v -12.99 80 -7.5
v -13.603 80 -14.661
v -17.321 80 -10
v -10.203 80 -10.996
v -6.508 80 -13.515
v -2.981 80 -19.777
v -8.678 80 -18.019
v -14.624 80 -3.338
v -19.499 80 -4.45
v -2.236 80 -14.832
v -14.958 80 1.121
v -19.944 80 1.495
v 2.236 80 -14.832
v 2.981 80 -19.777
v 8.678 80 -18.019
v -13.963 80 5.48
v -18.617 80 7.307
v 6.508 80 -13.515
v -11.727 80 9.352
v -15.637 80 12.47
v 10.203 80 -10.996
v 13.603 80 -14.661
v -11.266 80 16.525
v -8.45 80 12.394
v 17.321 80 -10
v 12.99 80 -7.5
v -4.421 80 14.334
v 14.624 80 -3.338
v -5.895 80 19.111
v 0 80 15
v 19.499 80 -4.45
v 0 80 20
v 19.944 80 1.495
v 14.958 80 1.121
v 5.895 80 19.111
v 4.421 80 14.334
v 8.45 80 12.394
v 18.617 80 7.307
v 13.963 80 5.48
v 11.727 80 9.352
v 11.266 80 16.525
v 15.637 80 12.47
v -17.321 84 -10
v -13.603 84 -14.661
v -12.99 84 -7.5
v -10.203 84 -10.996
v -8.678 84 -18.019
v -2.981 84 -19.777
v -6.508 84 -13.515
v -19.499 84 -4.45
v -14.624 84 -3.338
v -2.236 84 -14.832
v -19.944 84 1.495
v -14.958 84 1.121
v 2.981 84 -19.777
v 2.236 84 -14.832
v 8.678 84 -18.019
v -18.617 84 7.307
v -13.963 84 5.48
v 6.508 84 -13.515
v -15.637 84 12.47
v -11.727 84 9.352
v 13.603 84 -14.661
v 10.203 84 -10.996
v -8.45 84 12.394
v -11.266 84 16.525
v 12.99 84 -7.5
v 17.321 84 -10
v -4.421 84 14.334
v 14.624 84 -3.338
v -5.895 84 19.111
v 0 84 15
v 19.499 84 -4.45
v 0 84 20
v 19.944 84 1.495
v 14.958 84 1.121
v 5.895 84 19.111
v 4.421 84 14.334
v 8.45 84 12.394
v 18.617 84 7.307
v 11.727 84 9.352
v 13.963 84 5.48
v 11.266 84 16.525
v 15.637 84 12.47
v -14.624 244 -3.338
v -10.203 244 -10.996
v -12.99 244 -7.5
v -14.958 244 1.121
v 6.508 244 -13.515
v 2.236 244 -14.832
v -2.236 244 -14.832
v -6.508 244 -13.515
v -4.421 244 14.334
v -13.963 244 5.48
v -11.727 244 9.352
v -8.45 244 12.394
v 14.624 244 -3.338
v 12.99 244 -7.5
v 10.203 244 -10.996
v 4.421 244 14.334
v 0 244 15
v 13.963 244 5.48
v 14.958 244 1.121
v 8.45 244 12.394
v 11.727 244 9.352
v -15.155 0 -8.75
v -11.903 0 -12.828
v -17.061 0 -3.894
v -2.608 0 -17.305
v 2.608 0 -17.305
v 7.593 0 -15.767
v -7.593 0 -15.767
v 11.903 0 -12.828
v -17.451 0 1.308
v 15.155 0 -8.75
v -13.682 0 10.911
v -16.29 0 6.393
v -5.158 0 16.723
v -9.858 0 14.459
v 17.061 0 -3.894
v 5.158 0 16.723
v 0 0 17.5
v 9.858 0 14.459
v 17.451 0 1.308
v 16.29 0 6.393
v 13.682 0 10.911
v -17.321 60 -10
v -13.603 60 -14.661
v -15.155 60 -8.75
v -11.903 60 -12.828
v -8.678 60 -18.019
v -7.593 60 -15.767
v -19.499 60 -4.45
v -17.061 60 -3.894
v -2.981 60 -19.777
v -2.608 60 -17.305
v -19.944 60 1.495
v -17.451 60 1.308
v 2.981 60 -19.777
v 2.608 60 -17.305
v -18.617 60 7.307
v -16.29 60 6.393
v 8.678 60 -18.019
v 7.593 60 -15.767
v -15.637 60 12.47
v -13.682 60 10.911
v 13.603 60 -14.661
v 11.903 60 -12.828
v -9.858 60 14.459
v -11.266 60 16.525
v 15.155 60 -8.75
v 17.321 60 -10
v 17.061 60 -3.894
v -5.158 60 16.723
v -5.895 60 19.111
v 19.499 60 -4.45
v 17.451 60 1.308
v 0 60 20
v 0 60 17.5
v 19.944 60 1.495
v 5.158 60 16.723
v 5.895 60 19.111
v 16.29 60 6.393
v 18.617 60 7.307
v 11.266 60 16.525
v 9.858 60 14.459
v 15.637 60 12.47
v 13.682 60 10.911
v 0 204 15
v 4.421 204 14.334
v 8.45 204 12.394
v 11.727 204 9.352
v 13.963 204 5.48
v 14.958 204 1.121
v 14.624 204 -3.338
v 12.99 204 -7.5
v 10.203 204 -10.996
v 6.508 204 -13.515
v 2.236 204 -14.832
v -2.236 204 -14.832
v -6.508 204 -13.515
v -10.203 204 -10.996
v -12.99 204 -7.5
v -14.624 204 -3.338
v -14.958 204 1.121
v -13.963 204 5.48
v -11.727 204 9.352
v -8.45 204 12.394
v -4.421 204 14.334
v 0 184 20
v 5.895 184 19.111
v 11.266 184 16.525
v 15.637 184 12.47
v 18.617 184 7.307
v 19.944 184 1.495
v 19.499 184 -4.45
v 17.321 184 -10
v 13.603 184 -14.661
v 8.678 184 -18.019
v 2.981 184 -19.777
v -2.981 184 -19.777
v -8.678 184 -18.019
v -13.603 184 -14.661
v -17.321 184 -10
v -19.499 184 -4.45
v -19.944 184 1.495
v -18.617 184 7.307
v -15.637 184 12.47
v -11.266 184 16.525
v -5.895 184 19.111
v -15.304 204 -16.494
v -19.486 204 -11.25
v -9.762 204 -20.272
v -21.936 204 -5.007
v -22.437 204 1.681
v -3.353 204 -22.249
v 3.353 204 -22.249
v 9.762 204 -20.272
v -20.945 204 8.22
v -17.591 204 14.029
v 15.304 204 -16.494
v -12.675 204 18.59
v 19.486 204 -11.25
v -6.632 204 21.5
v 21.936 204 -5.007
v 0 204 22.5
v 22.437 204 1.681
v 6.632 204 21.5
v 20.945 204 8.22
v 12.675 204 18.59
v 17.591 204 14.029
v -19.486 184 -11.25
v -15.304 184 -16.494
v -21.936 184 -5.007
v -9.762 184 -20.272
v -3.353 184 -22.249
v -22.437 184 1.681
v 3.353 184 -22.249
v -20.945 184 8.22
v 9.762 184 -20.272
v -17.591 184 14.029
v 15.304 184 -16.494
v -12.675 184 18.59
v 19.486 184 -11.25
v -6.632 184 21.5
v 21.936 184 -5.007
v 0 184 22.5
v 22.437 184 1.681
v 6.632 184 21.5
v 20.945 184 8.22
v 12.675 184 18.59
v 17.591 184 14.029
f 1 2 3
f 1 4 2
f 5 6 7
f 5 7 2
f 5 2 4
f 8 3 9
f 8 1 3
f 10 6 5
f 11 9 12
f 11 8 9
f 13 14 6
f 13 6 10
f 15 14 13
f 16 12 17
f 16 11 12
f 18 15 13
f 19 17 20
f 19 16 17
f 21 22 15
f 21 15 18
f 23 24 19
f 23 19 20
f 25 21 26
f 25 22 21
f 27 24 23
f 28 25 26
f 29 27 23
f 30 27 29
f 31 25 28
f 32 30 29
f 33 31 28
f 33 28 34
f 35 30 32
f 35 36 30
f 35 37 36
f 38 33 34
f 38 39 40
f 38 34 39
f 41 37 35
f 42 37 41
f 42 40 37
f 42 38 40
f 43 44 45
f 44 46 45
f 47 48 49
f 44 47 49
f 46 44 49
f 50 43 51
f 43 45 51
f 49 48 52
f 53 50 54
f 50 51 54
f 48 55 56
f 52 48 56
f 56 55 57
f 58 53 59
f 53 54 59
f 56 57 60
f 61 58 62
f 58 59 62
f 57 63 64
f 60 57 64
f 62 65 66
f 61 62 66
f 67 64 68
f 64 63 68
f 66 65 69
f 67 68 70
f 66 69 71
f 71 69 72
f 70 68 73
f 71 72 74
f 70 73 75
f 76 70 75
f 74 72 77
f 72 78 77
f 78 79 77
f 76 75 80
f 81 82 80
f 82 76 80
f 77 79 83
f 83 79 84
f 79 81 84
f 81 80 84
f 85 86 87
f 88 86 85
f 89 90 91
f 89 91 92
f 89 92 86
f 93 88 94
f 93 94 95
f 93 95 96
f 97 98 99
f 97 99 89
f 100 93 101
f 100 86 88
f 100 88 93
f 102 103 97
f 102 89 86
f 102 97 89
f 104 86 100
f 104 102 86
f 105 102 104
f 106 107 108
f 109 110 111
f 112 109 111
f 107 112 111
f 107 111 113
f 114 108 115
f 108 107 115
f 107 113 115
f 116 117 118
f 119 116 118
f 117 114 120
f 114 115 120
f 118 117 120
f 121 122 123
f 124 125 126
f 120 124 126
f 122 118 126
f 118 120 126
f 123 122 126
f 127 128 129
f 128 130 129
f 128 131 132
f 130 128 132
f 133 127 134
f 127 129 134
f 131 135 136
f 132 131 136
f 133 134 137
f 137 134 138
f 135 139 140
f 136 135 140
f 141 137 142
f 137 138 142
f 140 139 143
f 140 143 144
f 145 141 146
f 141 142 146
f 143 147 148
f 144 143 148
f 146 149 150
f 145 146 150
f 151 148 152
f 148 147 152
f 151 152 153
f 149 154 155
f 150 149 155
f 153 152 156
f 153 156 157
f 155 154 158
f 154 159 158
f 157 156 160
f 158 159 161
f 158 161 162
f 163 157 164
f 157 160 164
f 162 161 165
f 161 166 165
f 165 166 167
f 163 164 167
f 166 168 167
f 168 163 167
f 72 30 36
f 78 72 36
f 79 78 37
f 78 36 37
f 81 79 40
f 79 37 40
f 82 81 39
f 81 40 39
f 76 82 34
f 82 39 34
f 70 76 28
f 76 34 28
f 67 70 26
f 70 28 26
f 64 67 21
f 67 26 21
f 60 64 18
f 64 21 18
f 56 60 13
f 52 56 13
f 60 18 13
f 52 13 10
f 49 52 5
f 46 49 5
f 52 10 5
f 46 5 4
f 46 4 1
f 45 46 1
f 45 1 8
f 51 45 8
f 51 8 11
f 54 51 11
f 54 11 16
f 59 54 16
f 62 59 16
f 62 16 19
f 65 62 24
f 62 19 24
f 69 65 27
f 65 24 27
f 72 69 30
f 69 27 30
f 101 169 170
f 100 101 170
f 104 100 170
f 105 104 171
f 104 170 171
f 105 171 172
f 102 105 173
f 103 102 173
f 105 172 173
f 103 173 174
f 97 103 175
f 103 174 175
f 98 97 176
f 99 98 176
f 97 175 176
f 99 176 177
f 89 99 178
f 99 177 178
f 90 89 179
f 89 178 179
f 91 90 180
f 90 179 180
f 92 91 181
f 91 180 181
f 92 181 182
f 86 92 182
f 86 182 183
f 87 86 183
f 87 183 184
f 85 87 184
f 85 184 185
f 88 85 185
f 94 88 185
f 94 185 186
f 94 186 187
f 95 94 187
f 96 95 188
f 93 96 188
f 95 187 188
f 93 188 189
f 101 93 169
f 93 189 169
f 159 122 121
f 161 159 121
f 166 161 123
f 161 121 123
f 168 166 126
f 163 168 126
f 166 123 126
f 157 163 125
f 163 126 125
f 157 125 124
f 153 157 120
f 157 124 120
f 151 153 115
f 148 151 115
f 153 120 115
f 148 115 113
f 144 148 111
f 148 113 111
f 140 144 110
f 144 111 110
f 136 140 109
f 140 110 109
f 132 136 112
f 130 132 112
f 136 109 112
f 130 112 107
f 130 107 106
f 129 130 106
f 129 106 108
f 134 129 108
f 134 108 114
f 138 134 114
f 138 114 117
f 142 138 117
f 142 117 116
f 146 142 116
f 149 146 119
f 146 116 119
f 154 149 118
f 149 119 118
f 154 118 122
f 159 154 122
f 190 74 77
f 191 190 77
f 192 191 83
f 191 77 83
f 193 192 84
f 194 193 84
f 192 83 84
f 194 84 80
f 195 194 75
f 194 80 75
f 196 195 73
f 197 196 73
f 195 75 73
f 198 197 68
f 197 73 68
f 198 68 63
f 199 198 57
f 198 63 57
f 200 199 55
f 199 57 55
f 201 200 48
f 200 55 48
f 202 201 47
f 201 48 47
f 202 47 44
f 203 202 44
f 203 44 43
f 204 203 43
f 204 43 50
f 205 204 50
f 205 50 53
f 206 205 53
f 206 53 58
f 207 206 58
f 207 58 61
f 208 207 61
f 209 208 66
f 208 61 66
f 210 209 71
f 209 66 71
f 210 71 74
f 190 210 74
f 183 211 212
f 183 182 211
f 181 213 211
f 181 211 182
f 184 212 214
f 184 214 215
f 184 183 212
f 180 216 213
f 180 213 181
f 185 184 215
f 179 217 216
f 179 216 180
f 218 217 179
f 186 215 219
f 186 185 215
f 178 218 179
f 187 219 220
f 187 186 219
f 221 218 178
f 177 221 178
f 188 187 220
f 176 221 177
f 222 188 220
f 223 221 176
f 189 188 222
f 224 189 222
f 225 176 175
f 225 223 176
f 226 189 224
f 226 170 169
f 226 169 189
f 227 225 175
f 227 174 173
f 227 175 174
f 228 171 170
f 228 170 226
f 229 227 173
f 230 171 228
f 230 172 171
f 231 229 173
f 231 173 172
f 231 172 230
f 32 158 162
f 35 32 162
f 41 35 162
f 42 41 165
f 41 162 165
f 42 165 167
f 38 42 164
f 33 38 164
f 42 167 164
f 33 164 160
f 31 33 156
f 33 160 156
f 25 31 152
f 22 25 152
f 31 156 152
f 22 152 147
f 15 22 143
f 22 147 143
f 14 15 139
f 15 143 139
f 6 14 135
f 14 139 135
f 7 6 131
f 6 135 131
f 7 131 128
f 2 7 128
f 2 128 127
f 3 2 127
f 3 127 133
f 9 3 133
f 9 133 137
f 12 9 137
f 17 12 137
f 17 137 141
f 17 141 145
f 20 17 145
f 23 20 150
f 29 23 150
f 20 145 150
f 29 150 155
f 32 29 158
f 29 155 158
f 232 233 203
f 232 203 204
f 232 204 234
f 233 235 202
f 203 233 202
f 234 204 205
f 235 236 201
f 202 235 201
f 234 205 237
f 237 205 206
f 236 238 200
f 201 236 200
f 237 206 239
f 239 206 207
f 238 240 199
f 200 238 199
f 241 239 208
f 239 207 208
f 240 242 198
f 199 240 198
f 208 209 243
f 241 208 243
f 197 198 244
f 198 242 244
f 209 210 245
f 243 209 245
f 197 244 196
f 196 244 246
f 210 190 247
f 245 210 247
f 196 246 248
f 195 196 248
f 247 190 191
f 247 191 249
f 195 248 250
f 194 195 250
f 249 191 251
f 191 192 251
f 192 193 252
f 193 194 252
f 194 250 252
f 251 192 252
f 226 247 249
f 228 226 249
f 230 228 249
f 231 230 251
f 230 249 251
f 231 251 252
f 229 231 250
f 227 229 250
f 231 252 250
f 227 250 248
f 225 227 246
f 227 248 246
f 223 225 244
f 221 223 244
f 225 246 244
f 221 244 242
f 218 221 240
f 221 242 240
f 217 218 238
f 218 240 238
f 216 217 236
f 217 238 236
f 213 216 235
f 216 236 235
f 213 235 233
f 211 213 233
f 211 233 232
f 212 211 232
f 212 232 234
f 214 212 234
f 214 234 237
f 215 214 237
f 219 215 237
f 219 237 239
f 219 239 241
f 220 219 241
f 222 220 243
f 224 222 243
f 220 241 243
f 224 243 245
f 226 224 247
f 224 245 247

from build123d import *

# Parameters (mm, degrees)
SKETCH_1_R      = 17.5
EXTRUDE_1_DEPTH = 60
SKETCH_2_R      = 20
EXTRUDE_2_DEPTH = 20
SKETCH_3_R      = 15
EXTRUDE_3_DEPTH = 4
SKETCH_4_R      = 20
EXTRUDE_4_DEPTH = 100
SKETCH_5_R      = 22.5
EXTRUDE_5_DEPTH = 20
SKETCH_6_R      = 15
EXTRUDE_6_DEPTH = 40


with BuildPart() as part:
    # 草图1 → 凸台-拉伸1 (new body)
    with BuildSketch(Plane(origin=(0, 0, 0), x_dir=(1, 0, 0), z_dir=(0, 1, 0))):
        with Locations(Location((0, 0, 0), (0, 0, 270))):
            Circle(SKETCH_1_R)
    extrude(amount=EXTRUDE_1_DEPTH)

    # 草图2 → 凸台-拉伸2 (add)
    with BuildSketch(Plane(origin=(0, 60, 0), x_dir=(1, 0, 0), z_dir=(0, 1, 0))):
        with Locations(Location((0, 0, 0), (0, 0, 270))):
            Circle(SKETCH_2_R)
    extrude(amount=EXTRUDE_2_DEPTH)

    # 草图3 → 凸台-拉伸3 (add)
    with BuildSketch(Plane(origin=(0, 80, 0), x_dir=(1, 0, 0), z_dir=(0, 1, 0))):
        with Locations(Location((0, 0, 0), (0, 0, 270))):
            Circle(SKETCH_3_R)
    extrude(amount=EXTRUDE_3_DEPTH)

    # 草图4 → 凸台-拉伸4 (add)
    with BuildSketch(Plane(origin=(0, 84, 0), x_dir=(1, 0, 0), z_dir=(0, 1, 0))):
        with Locations(Location((0, 0, 0), (0, 0, 270))):
            Circle(SKETCH_4_R)
    extrude(amount=EXTRUDE_4_DEPTH)

    # 草图5 → 凸台-拉伸5 (add)
    with BuildSketch(Plane(origin=(0, 184, 0), x_dir=(1, 0, 0), z_dir=(0, 1, 0))):
        with Locations(Location((0, 0, 0), (0, 0, 270))):
            Circle(SKETCH_5_R)
    extrude(amount=EXTRUDE_5_DEPTH)

    # 草图6 → 凸台-拉伸6 (add)
    with BuildSketch(Plane(origin=(0, 204, 0), x_dir=(1, 0, 0), z_dir=(0, 1, 0))):
        with Locations(Location((0, 0, 0), (0, 0, 270))):
            Circle(SKETCH_6_R)
    extrude(amount=EXTRUDE_6_DEPTH)


solid = part.part
